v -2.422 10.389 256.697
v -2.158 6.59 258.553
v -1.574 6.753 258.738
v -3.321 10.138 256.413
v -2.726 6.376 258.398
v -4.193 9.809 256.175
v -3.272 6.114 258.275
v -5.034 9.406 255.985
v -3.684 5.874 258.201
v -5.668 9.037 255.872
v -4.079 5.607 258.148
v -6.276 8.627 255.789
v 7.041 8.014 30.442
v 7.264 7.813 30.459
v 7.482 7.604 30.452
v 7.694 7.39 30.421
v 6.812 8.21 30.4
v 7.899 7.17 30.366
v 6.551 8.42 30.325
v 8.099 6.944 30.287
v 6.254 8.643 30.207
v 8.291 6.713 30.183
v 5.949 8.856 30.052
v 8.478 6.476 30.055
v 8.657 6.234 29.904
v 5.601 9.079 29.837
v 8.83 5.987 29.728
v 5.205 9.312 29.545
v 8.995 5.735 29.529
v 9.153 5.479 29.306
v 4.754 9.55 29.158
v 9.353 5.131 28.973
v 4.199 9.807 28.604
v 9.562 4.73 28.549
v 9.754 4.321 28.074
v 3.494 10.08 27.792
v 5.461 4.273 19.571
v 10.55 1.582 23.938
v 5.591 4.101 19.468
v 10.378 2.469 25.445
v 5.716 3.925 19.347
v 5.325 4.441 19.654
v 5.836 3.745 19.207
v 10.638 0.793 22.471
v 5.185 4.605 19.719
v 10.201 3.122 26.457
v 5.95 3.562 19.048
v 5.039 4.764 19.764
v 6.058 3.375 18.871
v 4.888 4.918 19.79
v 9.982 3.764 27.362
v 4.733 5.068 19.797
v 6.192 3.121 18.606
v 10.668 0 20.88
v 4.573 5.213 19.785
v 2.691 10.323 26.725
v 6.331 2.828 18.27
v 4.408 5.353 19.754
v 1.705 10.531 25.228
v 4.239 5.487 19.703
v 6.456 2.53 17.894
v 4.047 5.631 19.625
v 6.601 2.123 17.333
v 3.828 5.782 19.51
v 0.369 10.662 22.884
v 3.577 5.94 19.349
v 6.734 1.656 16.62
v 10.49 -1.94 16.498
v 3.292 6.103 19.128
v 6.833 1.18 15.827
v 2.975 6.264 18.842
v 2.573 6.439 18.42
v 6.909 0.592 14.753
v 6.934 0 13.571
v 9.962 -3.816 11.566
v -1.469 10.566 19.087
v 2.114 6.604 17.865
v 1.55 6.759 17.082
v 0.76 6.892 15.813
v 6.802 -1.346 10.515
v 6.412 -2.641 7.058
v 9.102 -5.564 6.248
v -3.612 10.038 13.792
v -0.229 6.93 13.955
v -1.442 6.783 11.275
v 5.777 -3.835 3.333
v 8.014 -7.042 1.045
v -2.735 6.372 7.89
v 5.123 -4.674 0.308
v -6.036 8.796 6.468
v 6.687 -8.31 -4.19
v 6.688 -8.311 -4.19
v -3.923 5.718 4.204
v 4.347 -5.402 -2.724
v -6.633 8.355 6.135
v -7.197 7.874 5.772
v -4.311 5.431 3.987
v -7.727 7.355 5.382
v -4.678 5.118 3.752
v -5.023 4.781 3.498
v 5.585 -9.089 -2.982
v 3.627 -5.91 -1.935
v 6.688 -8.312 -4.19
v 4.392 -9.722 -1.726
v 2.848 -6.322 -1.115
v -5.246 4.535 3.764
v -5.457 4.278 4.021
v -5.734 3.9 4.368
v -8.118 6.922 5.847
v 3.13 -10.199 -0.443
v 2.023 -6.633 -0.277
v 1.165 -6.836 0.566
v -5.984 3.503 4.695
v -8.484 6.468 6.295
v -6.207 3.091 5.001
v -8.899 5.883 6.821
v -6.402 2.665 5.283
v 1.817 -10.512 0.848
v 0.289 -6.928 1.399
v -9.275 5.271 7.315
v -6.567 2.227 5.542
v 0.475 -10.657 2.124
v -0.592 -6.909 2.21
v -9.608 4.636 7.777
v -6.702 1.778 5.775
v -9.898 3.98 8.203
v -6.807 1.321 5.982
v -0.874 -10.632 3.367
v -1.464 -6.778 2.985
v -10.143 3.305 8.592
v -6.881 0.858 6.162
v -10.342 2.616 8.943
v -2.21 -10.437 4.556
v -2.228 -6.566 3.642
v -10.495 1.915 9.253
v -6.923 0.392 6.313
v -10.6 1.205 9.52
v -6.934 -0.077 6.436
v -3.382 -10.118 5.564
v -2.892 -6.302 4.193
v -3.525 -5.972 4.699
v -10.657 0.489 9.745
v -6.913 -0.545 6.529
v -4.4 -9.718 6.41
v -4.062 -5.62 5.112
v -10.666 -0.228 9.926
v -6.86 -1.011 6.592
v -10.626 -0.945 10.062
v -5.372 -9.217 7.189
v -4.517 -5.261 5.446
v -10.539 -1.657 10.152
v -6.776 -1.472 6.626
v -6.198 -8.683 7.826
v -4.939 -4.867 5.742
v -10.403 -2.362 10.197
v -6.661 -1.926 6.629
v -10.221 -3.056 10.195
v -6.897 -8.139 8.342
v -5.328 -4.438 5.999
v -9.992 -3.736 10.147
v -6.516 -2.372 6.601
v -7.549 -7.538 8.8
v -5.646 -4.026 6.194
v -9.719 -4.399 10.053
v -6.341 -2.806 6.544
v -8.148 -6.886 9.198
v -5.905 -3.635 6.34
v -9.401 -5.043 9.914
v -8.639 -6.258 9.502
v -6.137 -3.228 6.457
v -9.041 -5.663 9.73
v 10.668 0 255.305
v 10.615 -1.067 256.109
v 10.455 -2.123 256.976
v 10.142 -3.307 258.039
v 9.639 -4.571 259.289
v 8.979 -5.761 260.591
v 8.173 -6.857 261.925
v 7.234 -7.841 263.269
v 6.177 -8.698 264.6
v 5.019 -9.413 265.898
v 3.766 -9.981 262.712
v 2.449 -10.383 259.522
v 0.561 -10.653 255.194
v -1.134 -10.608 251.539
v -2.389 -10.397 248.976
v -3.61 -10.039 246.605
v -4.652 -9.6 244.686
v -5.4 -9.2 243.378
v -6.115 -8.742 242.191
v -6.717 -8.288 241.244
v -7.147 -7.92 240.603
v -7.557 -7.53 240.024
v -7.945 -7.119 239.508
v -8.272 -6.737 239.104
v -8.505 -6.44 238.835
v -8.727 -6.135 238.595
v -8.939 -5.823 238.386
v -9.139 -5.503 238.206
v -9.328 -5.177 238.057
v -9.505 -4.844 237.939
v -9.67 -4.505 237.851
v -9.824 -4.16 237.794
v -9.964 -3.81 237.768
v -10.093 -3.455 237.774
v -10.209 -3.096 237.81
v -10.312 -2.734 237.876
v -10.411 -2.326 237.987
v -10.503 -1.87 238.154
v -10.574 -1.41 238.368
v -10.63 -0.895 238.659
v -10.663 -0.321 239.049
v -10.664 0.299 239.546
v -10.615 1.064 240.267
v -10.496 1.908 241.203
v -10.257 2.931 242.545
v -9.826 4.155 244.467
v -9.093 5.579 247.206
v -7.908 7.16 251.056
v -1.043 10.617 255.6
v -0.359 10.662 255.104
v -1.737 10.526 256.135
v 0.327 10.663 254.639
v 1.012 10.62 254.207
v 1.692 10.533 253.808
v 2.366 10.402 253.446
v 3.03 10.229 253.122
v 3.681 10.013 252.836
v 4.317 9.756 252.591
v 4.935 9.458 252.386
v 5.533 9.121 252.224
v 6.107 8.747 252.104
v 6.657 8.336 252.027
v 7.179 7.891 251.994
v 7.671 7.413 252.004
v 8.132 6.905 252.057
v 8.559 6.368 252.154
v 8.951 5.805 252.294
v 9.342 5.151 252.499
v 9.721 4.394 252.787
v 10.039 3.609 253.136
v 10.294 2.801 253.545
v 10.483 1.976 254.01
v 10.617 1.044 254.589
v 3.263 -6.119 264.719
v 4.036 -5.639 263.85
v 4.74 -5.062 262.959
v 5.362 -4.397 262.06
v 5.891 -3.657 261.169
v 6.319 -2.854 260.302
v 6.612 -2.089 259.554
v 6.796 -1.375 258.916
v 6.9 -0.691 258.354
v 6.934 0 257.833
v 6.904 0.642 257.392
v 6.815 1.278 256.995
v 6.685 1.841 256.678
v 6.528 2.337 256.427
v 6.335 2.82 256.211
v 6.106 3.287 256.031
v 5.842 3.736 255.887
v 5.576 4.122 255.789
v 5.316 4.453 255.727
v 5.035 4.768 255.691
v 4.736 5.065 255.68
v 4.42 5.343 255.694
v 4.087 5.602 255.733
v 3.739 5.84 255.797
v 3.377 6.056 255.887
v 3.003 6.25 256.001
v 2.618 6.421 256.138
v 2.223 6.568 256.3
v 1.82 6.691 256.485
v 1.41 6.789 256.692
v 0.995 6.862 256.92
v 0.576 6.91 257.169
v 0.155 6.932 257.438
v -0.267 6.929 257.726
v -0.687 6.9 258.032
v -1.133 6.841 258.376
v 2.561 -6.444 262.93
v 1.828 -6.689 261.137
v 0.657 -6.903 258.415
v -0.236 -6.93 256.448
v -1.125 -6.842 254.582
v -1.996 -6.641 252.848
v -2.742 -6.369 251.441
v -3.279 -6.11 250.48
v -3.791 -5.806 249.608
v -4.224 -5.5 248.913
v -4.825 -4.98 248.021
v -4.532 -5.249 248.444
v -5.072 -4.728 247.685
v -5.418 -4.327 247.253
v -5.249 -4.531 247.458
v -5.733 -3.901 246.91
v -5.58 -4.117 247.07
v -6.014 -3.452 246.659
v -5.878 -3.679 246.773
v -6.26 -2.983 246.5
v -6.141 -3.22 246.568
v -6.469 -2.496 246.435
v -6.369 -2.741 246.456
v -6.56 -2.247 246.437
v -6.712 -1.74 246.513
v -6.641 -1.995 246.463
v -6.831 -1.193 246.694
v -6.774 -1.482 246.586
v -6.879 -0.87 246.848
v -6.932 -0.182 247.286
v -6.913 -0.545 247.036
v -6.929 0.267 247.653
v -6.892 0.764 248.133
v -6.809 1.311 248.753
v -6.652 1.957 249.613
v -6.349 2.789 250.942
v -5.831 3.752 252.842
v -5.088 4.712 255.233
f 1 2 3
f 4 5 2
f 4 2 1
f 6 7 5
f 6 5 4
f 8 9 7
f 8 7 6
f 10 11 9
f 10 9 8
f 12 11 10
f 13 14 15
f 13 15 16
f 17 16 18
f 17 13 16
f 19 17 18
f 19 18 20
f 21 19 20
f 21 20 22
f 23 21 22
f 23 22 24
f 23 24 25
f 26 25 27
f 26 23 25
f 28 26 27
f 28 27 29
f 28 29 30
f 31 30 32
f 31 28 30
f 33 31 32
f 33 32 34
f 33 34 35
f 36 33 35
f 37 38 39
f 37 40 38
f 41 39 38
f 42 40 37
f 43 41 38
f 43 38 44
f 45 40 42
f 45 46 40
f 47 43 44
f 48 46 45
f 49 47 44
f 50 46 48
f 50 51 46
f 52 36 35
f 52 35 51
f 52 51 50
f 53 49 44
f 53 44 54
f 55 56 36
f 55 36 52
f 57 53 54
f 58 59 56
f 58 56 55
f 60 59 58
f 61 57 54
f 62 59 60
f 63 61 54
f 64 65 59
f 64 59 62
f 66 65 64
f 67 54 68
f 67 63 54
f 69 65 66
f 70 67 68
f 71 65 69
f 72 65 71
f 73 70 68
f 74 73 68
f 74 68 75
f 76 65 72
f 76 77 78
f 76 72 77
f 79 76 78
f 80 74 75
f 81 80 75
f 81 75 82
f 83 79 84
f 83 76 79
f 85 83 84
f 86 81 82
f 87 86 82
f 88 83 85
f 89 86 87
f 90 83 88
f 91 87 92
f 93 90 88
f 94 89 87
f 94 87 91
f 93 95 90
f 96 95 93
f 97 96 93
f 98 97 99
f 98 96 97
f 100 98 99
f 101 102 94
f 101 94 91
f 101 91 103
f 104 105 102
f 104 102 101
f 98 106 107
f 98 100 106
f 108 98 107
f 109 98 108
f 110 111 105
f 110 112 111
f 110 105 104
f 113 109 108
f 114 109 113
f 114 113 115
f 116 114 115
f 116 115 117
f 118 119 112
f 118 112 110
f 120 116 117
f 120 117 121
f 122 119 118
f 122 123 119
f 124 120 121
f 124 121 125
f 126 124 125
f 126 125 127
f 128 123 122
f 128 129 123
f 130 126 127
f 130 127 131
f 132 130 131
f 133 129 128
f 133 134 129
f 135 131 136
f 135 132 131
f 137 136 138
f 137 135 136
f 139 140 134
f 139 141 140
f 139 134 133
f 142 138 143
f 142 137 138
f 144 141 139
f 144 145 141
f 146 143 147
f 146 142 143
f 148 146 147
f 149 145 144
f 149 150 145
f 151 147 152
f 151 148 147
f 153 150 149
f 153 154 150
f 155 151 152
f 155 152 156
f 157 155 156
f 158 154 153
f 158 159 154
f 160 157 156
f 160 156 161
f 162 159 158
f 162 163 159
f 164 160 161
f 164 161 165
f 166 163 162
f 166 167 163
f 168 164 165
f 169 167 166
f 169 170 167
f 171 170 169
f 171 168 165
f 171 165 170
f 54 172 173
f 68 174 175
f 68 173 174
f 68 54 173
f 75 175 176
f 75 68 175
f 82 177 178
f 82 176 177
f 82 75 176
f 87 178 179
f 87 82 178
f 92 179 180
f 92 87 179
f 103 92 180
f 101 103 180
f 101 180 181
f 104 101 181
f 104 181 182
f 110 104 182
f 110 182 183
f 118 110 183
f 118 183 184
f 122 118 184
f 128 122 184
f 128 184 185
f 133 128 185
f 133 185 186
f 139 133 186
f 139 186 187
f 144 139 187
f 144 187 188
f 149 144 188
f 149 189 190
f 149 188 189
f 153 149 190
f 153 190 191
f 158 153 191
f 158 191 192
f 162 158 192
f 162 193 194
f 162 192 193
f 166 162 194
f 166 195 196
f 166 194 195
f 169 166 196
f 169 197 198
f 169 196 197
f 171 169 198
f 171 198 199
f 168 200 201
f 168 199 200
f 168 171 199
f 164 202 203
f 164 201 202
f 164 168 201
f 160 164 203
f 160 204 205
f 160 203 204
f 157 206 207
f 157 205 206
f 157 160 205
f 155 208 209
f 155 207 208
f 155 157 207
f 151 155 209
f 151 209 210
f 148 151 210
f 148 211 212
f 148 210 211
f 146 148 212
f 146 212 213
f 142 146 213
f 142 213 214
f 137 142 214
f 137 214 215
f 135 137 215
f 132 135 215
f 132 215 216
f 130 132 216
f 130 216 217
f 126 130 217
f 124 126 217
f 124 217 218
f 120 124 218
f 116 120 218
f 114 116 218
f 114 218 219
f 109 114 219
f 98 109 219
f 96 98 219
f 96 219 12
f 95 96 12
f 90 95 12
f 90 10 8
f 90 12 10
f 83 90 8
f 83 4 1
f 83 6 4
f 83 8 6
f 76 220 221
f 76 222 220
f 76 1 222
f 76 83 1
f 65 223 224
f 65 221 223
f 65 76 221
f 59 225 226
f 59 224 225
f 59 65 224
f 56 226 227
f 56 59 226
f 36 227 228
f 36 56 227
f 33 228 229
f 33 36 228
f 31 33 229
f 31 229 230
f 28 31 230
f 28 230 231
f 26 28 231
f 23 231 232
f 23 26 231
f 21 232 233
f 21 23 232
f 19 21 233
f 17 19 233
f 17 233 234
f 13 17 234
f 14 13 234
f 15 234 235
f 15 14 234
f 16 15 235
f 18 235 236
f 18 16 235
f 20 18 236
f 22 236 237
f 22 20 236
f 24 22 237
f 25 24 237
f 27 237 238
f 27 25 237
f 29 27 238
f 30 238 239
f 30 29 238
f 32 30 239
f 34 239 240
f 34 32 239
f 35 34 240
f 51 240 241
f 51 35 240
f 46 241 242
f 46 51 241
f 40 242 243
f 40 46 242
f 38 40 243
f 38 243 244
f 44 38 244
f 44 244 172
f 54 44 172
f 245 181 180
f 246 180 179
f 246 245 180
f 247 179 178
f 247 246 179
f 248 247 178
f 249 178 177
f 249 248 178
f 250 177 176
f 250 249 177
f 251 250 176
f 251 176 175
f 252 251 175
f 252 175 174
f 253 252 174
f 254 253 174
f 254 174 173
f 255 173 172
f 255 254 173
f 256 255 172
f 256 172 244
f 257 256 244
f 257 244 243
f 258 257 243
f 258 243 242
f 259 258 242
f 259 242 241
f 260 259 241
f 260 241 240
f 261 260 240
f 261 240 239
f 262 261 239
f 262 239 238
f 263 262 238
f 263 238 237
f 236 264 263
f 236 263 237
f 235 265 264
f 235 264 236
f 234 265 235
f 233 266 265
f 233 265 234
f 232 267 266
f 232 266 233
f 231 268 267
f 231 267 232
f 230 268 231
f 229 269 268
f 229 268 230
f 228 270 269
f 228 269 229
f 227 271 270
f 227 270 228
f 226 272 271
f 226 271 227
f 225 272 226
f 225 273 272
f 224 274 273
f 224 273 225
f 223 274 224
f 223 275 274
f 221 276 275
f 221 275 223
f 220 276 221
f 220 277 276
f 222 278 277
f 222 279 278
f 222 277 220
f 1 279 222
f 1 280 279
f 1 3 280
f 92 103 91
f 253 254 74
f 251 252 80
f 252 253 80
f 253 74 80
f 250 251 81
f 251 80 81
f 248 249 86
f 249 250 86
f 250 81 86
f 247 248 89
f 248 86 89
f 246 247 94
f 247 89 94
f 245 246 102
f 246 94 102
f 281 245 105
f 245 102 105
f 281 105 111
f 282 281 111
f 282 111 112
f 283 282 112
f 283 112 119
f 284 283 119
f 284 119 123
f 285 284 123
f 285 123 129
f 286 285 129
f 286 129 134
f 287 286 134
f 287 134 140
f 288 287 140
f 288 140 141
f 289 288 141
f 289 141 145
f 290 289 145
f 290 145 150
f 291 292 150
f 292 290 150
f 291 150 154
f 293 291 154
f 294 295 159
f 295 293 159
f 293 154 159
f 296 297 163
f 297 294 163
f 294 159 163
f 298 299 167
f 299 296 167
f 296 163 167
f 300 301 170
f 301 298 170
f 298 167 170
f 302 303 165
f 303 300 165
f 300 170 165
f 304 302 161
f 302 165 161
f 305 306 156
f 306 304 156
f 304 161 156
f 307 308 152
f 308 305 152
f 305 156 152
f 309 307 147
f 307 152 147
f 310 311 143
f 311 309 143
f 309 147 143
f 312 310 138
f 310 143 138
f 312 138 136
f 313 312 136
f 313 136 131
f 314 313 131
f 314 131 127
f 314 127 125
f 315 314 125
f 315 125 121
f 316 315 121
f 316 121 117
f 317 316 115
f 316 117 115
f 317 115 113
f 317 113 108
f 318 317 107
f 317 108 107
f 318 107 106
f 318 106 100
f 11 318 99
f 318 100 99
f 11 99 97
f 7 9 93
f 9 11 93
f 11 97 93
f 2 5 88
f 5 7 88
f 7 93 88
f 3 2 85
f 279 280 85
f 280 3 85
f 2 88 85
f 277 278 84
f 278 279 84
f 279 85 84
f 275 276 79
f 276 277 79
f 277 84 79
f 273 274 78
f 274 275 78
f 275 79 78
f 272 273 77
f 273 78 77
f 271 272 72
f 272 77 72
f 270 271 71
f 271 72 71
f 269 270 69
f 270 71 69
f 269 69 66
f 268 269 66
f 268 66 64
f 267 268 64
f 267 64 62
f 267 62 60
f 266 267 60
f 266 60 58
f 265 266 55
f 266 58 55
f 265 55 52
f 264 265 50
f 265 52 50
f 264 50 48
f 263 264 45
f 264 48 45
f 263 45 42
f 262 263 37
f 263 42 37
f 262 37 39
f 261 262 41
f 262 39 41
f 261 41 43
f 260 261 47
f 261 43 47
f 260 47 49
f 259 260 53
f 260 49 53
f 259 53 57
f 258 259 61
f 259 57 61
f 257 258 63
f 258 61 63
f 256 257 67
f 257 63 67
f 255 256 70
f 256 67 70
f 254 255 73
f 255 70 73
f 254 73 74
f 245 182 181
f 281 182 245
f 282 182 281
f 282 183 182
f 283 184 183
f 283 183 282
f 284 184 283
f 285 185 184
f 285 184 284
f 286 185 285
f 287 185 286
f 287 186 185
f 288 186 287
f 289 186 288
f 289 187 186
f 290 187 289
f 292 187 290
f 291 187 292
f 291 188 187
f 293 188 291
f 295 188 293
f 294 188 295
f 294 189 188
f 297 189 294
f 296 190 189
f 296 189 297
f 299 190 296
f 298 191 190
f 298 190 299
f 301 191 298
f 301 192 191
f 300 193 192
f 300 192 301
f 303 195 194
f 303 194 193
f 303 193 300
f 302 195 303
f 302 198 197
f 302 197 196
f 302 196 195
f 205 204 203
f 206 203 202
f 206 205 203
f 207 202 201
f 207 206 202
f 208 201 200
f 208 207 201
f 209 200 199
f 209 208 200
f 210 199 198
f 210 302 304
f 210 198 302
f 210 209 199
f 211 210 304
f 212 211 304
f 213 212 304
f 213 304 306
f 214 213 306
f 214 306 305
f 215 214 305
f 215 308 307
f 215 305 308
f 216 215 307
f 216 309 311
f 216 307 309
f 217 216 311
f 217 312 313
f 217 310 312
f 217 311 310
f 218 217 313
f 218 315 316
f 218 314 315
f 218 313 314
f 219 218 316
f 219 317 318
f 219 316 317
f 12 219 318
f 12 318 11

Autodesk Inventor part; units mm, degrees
ref_plane "Start Plane" through (0, 0, -4.19) normal (0, 0, 1) x (1, 0, 0)
ref_plane "End Plane" through (0, 0, 265.8983) normal (0, 0, 1) x (1, 0, 0)
sketch "Sketch" plane through (0, 0, 0) normal (0, 0, 1) x (1, 0, 0)
  circle A0 centre (0, 0) radius 6.9342
  circle A1 centre (0, 0) radius 10.668
  dimension "d0" = 21.336
  dimension "d1" = 3.7338
extrude "Body" add sketch "Sketch" along normal up to surface (270.0883 mm away) from surface at -4.19
sketch "Sketch3" plane through (0, 0, 0) normal (0, 0, 1) x (1, 0, 0)
  line L0 (0, 0) -> (10, 0)
ref_plane "Work Plane3" through (0, 0, 0) normal (0, -1, 0) x (1, 0, 0)
sketch "Sketch4" plane through (0, 0, 0) normal (0, -1, 0) x (1, 0, 0)
  line L0 (-2, -4.19) -> (12, -4.19)
  line L1 (-2, 265.8983) -> (12, 265.8983)
  dimension "d7" = 270.0883
ref_plane "Work Plane4" through (10.0091, 3.6912, 287.2885) normal (-0.8617, -0.3178, 0.3957) x (0.468, -0.1962, 0.8617)
split "Split1" plane through (10.0091, 3.6912, 287.2885) removes the side toward (-0.8617, -0.3178, 0.3957)
ref_plane "Work Plane5" through (-7.3135, -7.7665, 273.0637) normal (0.4817, 0.5116, 0.7115) x (0.8644, -0.144, -0.4817)
split "Split2" plane through (-7.3135, -7.7665, 273.0637) removes the side toward (0.4817, 0.5116, 0.7115)
ref_plane "Work Plane6" through (7.4386, -7.6468, 269.3352) normal (-0.3751, 0.3856, 0.843) x (0.9237, 0.0785, 0.3751)
split "Split3" plane through (7.4386, -7.6468, 269.3352) removes the side toward (-0.3751, 0.3856, 0.843)
ref_plane "Work Plane7" through (-7.3135, -7.7665, -30.4674) normal (0.647, 0.6871, -0.3305) x (0.3747, -0.664, -0.647)
split "Split4" plane through (-7.3135, -7.7665, -30.4674) removes the side toward (0.647, 0.6871, -0.3305)
ref_plane "Work Plane8" through (-0.1362, -10.6671, -7.916) normal (0.0076, 0.5958, -0.8031) x (0.9997, -0.023, -0.0076)
split "Split5" plane through (-0.1362, -10.6671, -7.916) removes the side toward (0.0076, 0.5958, -0.8031)
ref_plane "Work Plane9" through (10.325, 2.6834, -10.2024) normal (-0.6689, -0.1739, -0.7227) x (-0.6137, -0.4194, 0.6689)
split "Split6" plane through (10.325, 2.6834, -10.2024) removes the side toward (-0.6689, -0.1739, -0.7227)
equation "\"d0\" = G_H"
equation "\"d1\" = G_T"
equation "\"d2\" = G_L"
equation "\"G_H\" = 21.336"
equation "\"G_T\" = 3.7338"
equation "\"G_L\" = 270.08826"
equation "\"G_OFFSET_START\" = 4.18997"
equation "\"G_OFFSET_END\" = 3.36995"
equation "\"d4\" = -G_OFFSET_START"
equation "\"d5\" = G_OFFSET_END + B_L"
equation "\"B_L\" = 262.52833"
properties part number "ANSI - 1/2 x 0.147 - 10.633" material "Steel, Mild"
